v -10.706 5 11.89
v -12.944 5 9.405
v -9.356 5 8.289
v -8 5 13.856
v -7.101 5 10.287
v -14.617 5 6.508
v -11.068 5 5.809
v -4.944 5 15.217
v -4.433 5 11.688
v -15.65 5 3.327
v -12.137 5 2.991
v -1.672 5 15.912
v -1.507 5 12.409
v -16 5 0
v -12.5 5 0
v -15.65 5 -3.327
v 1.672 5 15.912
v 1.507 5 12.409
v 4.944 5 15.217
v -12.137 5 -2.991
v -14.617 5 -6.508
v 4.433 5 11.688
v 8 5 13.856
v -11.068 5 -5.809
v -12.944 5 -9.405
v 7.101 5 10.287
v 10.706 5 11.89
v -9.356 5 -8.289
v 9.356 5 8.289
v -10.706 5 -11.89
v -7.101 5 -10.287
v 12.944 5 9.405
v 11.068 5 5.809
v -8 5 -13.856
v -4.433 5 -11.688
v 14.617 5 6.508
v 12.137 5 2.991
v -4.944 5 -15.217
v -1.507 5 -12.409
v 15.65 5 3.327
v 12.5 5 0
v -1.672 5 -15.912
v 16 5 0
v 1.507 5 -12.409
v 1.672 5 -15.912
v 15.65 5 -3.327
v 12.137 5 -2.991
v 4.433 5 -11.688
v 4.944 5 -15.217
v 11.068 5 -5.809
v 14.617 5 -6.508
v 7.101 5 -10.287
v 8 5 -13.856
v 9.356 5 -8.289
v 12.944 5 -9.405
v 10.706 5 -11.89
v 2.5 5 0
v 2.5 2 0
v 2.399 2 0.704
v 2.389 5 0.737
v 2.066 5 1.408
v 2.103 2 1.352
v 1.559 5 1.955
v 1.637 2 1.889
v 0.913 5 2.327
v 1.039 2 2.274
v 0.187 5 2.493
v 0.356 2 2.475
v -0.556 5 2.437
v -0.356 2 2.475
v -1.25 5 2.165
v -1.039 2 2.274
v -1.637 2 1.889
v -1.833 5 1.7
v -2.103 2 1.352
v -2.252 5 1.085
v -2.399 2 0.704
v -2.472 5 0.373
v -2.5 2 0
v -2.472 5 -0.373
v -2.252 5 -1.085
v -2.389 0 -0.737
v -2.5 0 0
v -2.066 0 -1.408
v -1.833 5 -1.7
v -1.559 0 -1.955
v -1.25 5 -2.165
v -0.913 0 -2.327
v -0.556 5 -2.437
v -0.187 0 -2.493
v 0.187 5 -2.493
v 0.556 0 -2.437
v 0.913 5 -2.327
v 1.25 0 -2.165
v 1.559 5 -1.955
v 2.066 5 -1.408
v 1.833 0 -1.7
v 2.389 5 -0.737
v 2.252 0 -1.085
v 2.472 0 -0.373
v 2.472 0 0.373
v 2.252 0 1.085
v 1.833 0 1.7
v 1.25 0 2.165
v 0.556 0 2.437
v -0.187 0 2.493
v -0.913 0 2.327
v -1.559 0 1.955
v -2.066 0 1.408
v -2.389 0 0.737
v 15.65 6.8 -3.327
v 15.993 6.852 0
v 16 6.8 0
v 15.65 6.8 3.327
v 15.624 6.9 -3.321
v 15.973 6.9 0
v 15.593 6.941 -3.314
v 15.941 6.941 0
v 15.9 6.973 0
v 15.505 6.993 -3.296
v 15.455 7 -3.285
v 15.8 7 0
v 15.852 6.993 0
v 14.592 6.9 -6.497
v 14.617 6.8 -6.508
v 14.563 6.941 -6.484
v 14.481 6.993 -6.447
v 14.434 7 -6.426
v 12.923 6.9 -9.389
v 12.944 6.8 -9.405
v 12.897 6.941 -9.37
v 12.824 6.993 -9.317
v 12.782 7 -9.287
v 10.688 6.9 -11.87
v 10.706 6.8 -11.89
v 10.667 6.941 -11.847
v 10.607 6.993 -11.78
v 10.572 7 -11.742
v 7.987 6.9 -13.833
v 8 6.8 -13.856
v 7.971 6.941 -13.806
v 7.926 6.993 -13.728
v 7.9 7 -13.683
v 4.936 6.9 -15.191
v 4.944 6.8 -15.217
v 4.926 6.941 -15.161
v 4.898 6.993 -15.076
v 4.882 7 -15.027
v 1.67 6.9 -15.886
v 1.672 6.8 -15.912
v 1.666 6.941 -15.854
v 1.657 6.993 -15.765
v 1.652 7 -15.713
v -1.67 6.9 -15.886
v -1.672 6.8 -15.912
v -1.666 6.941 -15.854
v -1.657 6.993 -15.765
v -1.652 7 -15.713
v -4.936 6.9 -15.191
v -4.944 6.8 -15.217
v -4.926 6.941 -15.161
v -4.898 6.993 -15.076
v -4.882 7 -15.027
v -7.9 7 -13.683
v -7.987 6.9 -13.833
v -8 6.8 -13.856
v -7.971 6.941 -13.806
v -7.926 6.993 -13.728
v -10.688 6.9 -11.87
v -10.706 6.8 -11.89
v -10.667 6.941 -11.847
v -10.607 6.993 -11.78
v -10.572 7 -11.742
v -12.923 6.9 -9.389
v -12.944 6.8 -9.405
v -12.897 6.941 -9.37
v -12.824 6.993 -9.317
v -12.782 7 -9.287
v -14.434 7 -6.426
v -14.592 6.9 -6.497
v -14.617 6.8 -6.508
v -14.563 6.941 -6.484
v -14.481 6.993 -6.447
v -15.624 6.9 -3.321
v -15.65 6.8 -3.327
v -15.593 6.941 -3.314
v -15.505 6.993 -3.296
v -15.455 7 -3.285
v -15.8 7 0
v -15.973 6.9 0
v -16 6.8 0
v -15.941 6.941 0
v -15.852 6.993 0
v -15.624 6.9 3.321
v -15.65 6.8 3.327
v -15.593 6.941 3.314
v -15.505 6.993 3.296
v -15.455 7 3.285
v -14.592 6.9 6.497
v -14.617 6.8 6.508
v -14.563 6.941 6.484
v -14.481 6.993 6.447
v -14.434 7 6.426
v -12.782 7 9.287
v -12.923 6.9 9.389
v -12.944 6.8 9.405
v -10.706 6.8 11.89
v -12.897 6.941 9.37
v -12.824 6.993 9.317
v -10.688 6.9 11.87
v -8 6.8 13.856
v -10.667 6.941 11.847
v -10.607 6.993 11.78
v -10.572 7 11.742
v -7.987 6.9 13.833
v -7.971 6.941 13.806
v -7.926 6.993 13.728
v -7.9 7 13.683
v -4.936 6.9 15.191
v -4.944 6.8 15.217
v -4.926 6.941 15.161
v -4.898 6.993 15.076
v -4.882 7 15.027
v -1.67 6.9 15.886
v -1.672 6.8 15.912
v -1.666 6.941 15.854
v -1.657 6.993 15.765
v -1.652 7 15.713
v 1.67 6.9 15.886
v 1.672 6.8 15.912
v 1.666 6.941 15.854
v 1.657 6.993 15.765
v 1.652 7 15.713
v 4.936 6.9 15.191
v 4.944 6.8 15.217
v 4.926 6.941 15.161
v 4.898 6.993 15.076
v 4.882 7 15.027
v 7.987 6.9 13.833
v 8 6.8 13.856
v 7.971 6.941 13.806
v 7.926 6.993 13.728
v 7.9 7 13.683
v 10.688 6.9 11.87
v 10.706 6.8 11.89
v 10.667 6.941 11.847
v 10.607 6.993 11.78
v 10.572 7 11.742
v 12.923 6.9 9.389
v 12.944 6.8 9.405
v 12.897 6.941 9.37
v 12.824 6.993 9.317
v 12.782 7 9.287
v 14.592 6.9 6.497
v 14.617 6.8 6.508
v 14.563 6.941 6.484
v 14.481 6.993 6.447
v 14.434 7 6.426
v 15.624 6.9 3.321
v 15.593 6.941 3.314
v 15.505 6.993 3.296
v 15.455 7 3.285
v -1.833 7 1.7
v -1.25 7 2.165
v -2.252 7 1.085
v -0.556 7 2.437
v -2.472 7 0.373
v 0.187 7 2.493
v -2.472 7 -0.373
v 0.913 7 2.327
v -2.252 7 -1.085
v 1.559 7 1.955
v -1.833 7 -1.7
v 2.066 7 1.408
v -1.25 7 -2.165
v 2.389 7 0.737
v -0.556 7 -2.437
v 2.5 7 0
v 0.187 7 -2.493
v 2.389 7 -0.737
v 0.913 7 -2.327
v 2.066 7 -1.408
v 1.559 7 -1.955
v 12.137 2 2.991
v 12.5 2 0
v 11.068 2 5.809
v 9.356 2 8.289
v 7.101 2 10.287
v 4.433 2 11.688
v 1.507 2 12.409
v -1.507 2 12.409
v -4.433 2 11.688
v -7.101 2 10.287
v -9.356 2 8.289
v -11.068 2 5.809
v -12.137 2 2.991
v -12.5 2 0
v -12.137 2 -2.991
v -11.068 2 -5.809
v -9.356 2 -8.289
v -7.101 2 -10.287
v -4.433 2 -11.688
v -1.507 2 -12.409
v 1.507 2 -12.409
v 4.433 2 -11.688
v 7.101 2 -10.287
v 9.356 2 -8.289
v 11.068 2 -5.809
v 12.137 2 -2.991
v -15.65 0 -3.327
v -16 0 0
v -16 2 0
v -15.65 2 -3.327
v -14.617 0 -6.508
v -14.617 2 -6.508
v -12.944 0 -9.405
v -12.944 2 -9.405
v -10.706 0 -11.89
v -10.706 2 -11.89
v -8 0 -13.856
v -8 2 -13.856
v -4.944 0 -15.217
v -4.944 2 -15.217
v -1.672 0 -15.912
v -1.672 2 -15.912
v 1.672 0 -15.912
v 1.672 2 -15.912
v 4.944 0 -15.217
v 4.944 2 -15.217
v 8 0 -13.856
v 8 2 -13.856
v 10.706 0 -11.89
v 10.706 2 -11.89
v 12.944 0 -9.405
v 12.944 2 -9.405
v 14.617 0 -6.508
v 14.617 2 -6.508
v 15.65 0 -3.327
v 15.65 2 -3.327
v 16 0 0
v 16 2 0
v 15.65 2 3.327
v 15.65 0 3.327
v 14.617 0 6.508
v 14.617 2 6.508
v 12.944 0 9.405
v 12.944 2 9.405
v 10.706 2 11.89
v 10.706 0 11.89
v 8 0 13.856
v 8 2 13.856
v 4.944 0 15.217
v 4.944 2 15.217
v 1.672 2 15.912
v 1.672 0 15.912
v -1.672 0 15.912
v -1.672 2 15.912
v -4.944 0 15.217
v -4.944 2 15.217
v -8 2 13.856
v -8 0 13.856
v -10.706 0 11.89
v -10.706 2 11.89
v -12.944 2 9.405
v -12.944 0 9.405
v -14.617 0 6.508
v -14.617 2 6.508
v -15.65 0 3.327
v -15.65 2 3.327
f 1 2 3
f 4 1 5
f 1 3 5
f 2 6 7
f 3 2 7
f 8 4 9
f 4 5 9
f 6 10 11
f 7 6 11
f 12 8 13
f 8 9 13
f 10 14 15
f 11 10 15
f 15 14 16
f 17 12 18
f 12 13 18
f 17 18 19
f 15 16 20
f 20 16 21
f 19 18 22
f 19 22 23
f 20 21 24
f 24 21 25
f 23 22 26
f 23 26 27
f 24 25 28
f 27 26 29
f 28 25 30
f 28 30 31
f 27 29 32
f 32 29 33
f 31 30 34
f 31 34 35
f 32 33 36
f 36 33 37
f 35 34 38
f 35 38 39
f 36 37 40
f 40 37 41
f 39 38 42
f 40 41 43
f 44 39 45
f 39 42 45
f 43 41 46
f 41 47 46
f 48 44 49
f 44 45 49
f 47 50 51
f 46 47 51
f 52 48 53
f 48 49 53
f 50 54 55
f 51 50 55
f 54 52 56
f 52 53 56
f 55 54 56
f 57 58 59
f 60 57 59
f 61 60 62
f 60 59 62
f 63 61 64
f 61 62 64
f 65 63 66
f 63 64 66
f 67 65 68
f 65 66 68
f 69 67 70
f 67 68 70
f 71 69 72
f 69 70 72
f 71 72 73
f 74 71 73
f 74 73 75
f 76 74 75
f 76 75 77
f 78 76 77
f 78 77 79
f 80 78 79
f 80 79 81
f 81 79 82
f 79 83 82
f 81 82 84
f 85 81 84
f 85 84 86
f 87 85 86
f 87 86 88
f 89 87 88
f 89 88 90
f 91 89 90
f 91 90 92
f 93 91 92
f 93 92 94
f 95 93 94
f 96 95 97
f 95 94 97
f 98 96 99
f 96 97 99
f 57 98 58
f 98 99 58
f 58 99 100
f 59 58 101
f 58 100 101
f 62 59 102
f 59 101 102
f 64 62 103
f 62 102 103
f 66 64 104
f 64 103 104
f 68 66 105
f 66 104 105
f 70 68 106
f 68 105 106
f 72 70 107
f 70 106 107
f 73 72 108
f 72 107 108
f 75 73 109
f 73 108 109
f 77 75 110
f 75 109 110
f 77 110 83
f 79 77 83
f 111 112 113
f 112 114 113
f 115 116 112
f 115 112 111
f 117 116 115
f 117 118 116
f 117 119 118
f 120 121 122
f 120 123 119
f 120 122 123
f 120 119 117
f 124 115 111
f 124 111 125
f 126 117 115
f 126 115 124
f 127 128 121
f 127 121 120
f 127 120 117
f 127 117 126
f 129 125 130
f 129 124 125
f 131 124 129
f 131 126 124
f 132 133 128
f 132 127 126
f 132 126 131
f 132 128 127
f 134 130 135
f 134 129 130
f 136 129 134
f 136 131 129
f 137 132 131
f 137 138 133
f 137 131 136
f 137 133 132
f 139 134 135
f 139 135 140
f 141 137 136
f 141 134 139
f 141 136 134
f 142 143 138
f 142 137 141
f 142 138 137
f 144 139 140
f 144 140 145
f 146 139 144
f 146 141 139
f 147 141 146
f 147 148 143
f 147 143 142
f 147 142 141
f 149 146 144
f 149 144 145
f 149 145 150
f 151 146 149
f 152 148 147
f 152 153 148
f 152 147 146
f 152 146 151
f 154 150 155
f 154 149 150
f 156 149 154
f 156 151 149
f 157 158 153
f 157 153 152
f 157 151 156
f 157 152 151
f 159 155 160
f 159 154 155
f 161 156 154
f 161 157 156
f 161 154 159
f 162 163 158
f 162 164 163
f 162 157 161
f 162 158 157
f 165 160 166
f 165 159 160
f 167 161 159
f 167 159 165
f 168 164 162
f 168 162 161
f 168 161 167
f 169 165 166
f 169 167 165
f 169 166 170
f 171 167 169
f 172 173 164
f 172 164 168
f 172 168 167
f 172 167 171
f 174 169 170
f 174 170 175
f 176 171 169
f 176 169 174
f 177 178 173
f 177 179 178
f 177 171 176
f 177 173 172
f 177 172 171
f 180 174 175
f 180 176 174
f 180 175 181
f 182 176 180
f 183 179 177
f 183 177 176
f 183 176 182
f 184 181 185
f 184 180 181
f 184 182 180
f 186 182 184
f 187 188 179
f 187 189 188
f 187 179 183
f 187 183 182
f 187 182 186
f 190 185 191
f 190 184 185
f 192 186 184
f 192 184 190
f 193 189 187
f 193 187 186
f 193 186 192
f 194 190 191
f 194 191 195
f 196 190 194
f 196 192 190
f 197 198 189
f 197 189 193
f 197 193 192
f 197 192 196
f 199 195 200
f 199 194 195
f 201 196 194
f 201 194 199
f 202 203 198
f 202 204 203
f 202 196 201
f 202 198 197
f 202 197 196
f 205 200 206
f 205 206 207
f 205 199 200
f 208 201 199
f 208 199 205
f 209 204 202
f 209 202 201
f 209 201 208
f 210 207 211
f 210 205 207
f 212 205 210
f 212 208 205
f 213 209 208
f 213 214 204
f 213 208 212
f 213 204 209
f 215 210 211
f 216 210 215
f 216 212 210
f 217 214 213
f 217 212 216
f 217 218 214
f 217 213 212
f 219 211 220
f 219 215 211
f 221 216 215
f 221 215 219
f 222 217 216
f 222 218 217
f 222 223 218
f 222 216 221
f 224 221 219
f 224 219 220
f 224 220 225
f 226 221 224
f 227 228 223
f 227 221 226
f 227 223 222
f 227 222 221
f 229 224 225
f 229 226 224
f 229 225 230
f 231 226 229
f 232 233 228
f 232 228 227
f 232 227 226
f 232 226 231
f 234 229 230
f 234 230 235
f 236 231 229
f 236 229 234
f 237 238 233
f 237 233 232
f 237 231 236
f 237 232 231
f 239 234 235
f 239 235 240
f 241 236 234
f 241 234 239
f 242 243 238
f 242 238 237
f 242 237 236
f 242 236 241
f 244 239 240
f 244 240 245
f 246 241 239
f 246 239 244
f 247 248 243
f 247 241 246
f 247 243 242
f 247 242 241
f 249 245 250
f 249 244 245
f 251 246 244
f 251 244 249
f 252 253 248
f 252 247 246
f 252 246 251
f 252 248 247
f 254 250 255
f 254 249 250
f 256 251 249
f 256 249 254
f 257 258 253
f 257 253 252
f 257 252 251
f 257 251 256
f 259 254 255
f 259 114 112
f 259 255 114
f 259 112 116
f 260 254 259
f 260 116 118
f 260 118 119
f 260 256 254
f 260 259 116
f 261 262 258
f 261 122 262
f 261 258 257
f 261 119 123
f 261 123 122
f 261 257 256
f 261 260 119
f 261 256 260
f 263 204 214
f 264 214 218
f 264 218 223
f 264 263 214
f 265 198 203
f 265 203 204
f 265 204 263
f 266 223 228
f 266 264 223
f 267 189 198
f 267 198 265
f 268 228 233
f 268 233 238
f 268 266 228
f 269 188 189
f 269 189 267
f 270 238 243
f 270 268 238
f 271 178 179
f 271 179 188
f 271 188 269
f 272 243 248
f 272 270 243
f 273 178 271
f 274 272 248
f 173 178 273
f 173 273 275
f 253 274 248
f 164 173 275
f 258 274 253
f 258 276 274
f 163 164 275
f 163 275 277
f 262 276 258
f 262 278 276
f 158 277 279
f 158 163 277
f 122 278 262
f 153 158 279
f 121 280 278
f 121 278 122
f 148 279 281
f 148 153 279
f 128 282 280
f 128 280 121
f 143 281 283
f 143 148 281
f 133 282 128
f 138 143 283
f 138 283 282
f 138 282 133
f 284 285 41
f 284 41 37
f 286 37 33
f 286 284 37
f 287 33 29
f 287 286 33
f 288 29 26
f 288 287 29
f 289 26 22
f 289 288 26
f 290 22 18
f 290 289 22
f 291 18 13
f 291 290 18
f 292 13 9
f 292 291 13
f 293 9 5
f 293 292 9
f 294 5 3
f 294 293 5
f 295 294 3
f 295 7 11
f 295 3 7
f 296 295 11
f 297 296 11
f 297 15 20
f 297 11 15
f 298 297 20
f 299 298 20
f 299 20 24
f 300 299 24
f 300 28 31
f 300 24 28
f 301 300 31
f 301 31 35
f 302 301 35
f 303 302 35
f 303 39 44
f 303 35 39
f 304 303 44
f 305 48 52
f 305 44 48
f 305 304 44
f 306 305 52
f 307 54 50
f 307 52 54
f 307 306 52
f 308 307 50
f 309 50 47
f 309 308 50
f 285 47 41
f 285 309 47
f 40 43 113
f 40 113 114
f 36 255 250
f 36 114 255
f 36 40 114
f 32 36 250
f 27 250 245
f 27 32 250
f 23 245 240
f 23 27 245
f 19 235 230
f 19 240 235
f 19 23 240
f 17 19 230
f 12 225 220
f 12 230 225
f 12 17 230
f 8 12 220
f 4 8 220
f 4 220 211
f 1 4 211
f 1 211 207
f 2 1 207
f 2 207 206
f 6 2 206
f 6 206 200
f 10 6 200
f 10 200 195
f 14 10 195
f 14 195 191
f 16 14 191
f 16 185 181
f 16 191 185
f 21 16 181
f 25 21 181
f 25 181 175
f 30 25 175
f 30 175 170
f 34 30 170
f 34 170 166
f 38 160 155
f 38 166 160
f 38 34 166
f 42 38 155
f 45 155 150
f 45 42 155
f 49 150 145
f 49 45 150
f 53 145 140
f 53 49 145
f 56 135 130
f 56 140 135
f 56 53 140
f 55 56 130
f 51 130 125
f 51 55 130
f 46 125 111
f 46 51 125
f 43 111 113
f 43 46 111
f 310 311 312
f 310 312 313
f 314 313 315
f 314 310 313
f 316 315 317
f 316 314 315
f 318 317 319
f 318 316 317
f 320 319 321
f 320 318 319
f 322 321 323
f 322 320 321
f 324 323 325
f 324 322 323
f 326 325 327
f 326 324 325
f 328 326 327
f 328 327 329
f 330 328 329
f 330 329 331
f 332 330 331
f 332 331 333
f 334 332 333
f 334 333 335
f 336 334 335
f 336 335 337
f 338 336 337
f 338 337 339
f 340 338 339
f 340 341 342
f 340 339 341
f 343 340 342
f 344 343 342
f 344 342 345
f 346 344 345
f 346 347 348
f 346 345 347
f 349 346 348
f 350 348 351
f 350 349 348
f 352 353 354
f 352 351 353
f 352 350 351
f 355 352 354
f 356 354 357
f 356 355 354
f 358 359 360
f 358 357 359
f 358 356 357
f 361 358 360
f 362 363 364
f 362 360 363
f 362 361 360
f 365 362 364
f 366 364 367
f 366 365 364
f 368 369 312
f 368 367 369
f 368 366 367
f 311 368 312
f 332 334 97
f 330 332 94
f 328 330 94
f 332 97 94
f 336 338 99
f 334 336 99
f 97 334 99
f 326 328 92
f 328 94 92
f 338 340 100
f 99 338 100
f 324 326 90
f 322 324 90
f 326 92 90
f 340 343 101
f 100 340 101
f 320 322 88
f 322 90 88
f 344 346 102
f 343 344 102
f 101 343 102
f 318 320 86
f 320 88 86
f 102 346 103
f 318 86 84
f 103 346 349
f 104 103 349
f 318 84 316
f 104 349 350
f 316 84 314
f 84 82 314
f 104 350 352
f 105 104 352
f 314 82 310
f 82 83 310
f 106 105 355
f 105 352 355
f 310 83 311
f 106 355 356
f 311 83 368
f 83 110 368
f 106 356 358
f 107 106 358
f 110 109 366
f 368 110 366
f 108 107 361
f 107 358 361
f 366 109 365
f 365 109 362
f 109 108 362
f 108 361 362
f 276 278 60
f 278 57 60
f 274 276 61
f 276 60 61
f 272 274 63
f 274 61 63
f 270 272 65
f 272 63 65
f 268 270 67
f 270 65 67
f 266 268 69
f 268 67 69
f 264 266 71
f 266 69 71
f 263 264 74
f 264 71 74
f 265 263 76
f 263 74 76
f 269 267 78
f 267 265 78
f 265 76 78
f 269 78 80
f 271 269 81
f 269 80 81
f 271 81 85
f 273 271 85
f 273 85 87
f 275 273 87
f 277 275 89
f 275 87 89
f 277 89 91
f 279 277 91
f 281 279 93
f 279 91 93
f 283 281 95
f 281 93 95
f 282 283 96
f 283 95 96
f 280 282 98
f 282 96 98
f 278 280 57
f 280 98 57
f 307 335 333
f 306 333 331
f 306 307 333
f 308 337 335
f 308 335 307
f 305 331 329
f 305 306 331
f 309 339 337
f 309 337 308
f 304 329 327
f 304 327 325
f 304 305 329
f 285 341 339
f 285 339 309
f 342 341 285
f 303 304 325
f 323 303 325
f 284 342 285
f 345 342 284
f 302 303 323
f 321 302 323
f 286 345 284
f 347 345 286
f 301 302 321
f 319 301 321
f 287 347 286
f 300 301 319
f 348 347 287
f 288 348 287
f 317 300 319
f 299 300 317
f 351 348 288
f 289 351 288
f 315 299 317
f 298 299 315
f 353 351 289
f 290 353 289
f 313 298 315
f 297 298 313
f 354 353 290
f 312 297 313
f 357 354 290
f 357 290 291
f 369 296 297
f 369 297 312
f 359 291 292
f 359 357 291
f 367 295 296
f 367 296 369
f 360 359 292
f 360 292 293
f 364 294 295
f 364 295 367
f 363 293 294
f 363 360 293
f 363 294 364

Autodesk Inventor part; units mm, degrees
ref_plane "YZ Plane" through (0, 0, 0) normal (1, 0, 0) x (0, 1, 0)
ref_plane "XZ Plane" through (0, 0, 0) normal (0, 1, 0) x (-1, 0, 0)
ref_plane "XY Plane" through (0, 0, 0) normal (0, 0, 1) x (1, 0, 0)
sketch "Sketch1" plane through (0, 0, 0) normal (0, 1, 0) x (-1, 0, 0)
  circle A0 centre (0, 0) radius 16
  circle A1 centre (0, 0) radius 2.5
  dimension "d0" = 32
  dimension "d1" = 5
extrude "Extrusion1" add sketch "Sketch1" along normal blind 2
sketch "Sketch2" plane through (0, 2, 0) normal (0, 1, 0) x (1, 0, 0)
  circle A0 centre (0, 0) radius 2.5 projected
  circle A1 centre (0, 0) radius 12.5
  dimension "d4" = 25
extrude "Extrusion2" add sketch "Sketch2" along normal blind 3
sketch "Sketch3" plane through (0, 5, 0) normal (0, 1, 0) x (1, 0, 0)
  circle A0 centre (0, 0) radius 16
  circle A1 centre (0, 0) radius 2.5
  dimension "d7" = 32
  dimension "d8" = 5
extrude "Extrusion3" add sketch "Sketch3" along normal blind 2
fillet "Fillet1" radius 0.2 1 edges at (-16, 7, 0)
properties part number "Piston" material "Aluminum 6061"
